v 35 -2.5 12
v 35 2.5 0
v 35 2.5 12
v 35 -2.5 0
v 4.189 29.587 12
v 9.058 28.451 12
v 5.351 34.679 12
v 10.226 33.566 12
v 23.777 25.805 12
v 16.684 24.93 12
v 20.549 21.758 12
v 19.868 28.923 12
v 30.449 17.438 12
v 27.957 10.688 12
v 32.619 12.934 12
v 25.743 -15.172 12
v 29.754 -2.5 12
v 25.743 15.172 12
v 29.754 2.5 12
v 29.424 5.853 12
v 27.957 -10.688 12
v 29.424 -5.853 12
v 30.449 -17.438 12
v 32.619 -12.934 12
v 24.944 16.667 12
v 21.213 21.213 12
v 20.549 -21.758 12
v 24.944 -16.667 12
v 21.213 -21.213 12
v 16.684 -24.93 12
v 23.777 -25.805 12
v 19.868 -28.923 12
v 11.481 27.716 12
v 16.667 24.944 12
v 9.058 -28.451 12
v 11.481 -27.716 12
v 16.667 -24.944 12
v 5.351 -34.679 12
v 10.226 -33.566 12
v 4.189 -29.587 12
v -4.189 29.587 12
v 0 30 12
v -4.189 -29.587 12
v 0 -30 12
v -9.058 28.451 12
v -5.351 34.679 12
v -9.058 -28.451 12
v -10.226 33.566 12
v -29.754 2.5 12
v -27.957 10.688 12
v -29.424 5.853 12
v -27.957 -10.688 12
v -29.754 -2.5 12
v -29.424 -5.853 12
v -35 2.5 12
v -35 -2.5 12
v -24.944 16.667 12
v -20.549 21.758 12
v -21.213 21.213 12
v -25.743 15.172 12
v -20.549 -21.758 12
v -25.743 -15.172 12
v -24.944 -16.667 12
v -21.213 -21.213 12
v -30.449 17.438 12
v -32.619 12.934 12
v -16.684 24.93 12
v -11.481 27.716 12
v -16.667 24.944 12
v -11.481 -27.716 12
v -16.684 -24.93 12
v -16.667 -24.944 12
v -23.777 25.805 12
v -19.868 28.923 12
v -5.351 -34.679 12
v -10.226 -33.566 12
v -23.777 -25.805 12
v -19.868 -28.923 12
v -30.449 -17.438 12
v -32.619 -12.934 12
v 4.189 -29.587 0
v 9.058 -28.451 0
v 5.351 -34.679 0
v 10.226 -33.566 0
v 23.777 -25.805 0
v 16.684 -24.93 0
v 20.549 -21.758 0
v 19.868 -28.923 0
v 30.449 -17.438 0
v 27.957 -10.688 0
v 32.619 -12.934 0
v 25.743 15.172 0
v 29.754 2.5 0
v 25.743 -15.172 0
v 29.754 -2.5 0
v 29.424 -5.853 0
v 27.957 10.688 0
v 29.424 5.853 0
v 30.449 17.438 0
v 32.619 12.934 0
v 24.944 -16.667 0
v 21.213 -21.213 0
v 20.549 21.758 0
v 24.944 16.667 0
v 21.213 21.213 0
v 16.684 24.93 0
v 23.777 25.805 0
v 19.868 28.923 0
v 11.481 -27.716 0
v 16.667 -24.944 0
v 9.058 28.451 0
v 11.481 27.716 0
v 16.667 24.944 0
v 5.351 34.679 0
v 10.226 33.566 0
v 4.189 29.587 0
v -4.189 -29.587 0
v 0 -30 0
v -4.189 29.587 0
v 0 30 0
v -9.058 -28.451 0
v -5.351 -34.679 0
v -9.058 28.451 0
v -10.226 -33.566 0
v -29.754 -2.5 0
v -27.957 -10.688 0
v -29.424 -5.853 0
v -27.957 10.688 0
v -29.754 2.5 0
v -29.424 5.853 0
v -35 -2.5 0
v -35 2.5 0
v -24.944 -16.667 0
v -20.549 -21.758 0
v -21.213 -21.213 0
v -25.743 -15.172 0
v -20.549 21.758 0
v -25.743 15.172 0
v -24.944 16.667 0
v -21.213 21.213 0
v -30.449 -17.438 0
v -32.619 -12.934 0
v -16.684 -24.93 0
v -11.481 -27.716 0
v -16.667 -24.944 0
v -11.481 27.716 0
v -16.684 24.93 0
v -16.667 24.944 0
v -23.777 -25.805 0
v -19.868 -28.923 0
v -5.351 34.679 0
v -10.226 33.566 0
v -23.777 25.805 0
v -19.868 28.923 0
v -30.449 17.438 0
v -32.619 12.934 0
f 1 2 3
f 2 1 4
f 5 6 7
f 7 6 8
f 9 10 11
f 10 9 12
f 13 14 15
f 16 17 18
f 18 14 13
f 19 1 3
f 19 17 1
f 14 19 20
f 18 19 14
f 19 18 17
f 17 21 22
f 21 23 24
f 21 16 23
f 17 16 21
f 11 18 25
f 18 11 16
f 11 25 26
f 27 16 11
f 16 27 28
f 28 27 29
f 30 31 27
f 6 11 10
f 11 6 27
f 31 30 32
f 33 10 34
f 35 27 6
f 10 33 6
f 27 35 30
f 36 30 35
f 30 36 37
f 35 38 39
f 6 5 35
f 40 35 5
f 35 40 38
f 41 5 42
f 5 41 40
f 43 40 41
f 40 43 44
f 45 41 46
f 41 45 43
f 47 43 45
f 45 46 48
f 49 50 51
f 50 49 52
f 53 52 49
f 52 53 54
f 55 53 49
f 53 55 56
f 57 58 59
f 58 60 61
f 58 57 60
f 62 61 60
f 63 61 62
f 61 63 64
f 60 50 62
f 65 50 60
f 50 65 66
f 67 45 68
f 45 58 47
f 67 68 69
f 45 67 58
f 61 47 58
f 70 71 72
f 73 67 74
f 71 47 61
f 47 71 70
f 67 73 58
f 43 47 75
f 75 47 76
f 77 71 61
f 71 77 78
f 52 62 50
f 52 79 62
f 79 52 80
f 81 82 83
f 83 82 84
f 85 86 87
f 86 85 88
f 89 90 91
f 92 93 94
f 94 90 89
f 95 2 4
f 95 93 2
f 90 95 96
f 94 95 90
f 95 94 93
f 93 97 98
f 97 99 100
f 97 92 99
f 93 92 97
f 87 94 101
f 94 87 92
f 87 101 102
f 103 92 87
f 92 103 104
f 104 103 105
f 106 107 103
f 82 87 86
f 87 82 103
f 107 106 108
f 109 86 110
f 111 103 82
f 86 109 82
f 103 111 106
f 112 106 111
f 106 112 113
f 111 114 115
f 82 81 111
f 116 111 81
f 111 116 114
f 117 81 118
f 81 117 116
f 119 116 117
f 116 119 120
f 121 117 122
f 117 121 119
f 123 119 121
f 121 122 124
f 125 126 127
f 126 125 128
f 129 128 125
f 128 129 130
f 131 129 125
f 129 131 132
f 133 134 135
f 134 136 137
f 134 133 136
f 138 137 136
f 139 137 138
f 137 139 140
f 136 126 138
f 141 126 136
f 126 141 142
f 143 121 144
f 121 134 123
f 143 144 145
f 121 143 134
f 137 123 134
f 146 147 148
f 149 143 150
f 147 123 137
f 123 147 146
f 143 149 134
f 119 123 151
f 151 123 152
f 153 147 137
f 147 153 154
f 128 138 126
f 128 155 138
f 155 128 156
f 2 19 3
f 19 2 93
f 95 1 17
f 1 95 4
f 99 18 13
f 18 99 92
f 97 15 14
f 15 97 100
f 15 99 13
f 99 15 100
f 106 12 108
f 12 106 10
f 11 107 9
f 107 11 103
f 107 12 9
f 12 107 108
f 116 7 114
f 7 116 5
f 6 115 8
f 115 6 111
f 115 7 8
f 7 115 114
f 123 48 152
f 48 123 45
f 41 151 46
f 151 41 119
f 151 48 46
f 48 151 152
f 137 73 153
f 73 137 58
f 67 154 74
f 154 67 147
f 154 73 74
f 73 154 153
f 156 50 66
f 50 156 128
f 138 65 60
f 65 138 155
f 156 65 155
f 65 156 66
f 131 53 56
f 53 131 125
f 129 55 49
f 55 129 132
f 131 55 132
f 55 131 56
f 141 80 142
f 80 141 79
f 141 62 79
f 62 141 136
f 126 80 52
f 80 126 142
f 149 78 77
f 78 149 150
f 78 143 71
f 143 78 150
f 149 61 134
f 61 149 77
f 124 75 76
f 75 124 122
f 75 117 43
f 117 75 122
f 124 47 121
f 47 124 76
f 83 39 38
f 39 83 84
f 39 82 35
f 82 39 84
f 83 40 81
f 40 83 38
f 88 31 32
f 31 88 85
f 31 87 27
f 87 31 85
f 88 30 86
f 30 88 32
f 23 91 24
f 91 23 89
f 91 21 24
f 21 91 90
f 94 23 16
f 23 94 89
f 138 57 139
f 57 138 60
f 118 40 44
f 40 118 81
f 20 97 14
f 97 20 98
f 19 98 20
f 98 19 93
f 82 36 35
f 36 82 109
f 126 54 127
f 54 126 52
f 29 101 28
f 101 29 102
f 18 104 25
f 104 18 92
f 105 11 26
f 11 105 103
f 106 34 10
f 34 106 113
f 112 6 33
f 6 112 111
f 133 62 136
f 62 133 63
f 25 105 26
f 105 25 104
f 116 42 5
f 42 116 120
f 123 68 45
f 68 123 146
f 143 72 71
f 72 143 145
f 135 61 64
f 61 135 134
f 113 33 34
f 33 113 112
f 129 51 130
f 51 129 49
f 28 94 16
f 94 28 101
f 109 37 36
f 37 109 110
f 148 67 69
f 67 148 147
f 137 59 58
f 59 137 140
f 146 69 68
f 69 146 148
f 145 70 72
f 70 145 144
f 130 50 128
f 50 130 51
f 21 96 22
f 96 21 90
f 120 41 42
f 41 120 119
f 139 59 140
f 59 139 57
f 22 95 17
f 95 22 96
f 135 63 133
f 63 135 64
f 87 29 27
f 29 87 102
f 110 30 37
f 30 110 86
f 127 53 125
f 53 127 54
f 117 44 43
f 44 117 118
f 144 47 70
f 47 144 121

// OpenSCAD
$fn = 32;

// ----------------------------------------------------------------------
// Spur blank: plain gear blank
// ----------------------------------------------------------------------

// --- parameters (mm) ---
disc_r = 30;              // blank root radius
disc_t = 12;              // blank thickness
n_teeth = 14;             // stub tooth count
tooth_w = 5;              // tooth width at the root
tooth_h = 5;              // tooth height above the root

out_r = disc_r + tooth_h;  // tip radius
bbox_x = 70.0;  // measured width over the teeth
bbox_y = 69.36;  // measured depth over the teeth

union() {
  cylinder(r = disc_r, h = disc_t);
  for (i = [0 : n_teeth - 1])
    rotate([0, 0, i * 360 / n_teeth])
      translate([disc_r - 1, -tooth_w / 2, 0])
        cube([tooth_h + 1, tooth_w, disc_t]);
}
